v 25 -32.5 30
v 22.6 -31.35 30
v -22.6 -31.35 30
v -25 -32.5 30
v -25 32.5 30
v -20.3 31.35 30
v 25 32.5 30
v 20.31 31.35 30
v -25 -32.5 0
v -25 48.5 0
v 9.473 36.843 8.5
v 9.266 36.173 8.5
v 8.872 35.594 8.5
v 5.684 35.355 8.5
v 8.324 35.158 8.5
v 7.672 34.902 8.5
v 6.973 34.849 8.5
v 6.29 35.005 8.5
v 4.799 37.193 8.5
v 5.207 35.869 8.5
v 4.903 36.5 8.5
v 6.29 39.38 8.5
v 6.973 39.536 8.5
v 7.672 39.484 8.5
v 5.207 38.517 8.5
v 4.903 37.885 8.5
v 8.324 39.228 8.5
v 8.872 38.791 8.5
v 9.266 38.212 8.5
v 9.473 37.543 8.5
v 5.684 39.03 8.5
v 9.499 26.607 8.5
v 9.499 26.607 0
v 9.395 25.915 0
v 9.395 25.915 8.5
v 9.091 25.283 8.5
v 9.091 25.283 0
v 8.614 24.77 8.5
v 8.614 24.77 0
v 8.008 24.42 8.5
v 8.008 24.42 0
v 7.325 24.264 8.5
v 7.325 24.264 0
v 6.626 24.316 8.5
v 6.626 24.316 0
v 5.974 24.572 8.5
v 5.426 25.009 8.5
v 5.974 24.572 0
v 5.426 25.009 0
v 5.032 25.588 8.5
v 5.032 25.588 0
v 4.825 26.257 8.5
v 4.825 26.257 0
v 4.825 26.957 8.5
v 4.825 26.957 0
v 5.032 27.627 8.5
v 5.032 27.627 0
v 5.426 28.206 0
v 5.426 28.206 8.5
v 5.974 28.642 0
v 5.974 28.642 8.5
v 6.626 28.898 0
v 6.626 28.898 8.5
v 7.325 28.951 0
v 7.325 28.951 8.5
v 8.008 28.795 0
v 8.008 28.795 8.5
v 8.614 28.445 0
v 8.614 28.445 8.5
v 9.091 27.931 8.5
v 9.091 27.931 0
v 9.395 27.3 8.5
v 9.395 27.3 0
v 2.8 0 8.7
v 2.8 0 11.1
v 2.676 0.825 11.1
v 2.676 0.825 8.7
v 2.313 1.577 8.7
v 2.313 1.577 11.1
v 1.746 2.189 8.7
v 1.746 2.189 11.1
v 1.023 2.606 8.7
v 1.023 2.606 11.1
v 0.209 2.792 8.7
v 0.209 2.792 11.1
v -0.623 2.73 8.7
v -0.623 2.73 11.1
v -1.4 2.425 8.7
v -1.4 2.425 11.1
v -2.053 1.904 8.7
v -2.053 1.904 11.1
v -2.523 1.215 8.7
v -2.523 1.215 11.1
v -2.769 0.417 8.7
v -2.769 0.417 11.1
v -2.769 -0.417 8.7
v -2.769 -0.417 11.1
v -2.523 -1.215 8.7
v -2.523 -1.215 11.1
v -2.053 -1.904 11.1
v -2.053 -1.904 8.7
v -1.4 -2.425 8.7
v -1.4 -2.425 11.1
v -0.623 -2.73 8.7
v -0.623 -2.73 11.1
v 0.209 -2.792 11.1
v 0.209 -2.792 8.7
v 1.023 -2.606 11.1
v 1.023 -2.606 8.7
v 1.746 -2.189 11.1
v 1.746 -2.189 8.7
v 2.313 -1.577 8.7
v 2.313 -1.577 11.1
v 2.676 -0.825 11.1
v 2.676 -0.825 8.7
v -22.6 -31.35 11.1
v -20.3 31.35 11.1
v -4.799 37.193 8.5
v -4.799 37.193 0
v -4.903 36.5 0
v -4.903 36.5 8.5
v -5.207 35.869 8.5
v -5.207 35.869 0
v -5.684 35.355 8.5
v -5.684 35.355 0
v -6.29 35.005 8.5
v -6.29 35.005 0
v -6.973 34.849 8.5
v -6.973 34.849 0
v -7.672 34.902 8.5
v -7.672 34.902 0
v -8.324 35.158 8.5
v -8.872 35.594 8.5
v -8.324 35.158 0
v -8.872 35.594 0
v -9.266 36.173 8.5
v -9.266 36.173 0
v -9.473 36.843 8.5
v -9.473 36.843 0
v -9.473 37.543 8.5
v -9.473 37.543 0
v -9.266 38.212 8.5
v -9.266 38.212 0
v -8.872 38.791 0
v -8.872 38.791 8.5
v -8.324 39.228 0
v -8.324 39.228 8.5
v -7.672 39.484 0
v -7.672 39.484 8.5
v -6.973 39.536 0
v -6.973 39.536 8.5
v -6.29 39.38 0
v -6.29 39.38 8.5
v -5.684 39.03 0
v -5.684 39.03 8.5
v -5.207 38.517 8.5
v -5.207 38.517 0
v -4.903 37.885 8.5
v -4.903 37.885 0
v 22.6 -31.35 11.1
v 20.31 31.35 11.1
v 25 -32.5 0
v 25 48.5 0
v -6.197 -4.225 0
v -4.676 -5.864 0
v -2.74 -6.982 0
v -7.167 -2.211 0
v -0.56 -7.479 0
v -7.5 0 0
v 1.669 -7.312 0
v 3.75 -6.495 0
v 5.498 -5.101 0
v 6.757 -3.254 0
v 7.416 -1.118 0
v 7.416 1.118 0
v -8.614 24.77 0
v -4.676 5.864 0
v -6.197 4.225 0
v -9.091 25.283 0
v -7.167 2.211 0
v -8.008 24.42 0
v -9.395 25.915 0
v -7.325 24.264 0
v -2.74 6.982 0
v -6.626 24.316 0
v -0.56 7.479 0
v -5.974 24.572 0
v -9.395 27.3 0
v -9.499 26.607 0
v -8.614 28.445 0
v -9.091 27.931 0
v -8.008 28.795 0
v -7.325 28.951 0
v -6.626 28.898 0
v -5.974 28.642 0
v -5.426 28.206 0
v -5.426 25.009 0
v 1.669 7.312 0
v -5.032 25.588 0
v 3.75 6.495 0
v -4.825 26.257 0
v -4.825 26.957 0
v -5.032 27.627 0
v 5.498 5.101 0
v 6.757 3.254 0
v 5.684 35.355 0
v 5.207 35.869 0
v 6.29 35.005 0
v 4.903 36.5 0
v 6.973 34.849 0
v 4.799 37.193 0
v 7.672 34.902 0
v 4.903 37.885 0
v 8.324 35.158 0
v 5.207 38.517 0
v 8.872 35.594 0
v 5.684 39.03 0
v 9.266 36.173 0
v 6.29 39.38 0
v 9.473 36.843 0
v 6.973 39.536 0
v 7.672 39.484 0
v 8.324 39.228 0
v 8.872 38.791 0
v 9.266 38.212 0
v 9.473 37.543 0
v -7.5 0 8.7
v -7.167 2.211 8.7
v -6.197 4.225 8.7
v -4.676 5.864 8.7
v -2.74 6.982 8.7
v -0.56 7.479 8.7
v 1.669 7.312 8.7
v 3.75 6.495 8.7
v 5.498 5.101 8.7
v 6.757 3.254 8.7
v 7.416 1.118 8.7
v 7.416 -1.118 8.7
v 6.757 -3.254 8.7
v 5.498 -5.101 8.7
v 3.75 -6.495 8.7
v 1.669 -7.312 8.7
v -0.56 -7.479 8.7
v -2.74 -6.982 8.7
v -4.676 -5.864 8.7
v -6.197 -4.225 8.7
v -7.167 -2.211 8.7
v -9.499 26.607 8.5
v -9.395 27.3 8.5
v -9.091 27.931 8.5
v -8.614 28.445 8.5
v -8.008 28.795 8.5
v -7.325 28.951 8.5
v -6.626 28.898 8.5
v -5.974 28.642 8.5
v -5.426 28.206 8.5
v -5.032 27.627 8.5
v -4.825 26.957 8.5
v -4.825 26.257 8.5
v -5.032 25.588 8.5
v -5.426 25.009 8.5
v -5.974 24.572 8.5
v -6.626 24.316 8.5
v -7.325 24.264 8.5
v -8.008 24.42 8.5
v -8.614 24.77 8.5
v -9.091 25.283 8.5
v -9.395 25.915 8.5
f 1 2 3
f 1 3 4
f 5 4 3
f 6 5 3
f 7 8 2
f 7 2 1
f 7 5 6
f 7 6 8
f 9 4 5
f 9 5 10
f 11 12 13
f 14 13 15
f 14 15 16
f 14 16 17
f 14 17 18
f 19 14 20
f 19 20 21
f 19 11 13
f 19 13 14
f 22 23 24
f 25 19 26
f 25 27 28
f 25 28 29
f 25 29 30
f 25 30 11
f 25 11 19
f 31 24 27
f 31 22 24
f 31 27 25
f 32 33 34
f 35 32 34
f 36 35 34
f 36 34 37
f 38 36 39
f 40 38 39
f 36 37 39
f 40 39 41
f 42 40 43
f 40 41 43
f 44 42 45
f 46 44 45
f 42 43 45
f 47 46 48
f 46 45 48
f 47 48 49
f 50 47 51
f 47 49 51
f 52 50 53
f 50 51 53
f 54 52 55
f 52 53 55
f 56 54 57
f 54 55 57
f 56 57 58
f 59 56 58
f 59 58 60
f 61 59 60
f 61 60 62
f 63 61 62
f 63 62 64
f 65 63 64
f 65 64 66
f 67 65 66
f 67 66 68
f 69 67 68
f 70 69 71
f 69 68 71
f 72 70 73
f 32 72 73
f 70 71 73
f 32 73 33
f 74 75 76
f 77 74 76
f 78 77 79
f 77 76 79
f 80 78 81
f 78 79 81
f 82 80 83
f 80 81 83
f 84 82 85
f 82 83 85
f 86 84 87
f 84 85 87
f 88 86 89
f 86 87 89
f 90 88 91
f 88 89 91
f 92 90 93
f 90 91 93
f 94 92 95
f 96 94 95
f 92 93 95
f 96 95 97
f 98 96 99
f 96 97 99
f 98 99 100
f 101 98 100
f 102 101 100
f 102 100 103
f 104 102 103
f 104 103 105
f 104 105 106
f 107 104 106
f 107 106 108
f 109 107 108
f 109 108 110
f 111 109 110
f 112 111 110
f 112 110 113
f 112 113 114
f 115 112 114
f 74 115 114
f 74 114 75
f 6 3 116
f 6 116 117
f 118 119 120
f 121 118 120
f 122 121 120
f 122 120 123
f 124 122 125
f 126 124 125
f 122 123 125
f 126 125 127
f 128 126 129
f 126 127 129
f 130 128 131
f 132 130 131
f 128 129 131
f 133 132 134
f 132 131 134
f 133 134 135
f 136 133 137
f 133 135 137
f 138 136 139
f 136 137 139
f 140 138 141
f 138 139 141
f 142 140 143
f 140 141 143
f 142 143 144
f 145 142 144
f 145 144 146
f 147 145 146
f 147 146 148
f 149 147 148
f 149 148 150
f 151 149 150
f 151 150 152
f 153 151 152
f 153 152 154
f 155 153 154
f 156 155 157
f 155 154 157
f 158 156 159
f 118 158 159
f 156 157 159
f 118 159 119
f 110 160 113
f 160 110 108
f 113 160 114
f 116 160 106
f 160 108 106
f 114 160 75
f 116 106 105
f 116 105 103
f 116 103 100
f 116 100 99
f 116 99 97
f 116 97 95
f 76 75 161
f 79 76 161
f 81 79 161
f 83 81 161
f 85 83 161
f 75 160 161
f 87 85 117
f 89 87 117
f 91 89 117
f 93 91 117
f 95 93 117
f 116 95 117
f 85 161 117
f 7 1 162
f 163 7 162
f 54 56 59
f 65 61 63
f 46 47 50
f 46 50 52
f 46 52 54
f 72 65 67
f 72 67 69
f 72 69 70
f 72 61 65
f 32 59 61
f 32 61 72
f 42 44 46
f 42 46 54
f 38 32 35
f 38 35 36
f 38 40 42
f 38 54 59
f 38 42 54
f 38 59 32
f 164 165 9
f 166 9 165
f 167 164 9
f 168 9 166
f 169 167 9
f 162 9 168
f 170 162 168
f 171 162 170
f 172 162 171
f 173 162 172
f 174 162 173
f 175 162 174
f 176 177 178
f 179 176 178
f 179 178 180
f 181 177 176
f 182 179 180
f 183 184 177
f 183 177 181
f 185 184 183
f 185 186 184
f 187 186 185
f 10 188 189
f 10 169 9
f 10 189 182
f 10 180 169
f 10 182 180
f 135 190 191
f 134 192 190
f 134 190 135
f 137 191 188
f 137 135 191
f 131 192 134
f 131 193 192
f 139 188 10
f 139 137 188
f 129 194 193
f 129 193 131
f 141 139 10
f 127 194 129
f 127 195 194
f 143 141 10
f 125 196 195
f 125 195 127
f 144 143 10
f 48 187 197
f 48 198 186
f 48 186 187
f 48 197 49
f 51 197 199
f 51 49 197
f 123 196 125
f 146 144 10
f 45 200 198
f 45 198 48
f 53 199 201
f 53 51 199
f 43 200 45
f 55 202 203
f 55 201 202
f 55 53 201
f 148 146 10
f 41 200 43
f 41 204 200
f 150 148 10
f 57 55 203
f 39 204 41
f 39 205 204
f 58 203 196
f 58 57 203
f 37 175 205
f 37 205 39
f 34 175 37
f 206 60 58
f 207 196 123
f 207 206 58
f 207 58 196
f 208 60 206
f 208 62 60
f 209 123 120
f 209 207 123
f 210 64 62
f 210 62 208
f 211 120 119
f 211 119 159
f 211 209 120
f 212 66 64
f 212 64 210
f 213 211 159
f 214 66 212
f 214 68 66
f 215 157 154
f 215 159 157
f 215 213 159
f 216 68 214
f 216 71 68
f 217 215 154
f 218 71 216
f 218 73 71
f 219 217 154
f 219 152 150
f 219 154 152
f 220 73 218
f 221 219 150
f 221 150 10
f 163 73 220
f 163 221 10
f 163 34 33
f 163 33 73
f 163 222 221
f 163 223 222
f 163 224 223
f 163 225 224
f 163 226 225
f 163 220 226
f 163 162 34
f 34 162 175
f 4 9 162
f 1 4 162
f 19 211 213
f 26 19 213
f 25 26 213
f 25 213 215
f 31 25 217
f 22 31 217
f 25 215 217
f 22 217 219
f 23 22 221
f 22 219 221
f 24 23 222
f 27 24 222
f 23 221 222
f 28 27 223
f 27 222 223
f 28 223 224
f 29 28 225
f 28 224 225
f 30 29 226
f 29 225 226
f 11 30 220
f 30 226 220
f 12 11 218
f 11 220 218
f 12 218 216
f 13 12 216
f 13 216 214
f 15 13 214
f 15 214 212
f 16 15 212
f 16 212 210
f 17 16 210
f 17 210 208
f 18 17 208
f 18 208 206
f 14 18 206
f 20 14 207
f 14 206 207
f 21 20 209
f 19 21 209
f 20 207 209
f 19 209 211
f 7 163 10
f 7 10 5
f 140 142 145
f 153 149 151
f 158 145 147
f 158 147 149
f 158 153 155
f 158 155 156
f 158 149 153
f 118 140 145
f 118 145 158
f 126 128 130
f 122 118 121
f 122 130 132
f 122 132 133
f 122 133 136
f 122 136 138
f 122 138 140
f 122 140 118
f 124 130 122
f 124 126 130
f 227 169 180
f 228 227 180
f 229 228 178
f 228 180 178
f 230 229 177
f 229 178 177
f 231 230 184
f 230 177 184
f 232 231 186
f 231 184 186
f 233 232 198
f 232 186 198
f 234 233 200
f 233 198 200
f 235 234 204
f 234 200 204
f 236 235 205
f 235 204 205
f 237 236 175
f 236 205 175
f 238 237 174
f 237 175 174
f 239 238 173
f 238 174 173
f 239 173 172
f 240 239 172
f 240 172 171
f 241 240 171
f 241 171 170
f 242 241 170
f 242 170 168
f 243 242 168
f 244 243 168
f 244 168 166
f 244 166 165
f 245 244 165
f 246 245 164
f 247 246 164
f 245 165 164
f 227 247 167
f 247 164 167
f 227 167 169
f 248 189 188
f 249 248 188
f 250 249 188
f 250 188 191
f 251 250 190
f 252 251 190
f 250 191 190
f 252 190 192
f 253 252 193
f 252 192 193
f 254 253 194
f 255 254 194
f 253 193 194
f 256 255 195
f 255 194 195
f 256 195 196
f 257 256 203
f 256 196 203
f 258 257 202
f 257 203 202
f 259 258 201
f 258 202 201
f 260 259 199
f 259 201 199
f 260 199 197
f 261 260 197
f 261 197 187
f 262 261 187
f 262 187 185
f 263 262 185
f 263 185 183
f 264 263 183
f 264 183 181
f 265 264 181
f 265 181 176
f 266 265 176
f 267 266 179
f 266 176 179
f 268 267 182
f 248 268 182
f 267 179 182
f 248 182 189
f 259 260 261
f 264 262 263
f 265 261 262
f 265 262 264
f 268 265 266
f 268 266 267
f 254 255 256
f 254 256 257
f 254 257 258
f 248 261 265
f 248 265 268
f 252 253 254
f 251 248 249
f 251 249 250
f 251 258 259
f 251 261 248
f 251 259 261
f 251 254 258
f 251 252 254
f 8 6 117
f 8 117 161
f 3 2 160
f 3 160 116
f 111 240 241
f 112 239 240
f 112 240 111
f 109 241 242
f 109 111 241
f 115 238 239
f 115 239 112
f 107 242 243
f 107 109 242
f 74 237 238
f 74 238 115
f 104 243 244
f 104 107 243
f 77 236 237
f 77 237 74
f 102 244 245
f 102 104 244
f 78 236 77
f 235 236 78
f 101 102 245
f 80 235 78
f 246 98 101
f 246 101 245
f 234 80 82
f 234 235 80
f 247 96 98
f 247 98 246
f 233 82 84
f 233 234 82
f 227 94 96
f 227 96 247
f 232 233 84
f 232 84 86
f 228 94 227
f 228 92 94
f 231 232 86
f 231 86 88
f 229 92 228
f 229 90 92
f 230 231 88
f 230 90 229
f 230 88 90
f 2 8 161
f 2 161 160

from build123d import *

# Parameters (mm, degrees)
SKICA1_W                 = 50
SKICA1_H                 = 65
P_IDAT_VYSUNUT_M1_DEPTH  = 30
P_IDAT_VYSUNUT_M2_DEPTH  = 50
ODEBRAT_VYSUNUT_M1_DEPTH = 18.9
SKICA6_R                 = 2.8
ODEBRAT_VYSUNUT_M2_DEPTH = 58.744783314
SKICA7_R                 = 7.5
ODEBRAT_VYSUNUT_M3_DEPTH = 8.7
SKICA8_R                 = 2.35
ODEBRAT_VYSUNUT_M4_DEPTH = 8.5


with BuildPart() as part:
    # Skica1 → Přidat vysunutím1 (new body)
    with BuildSketch(Plane.XY):
        Rectangle(SKICA1_W, SKICA1_H)
    extrude(amount=P_IDAT_VYSUNUT_M1_DEPTH)

    # Skica3 → Přidat vysunutím2 (add, through all)
    with BuildSketch(Plane(origin=(25, 0, 0), x_dir=(0, 0, -1), z_dir=(1, 0, 0))):
        Polygon((0, 32.5), (0, 48.5), (-30, 32.5), align=None)
    extrude(amount=-P_IDAT_VYSUNUT_M2_DEPTH)

    # Skica5 → Odebrat vysunutím1 (cut)
    with BuildSketch(Plane.XY.offset(30)):
        Polygon((-20.3, 31.35), (20.31, 31.35), (22.6, -31.35), (-22.6, -31.35), align=None)
    extrude(amount=-ODEBRAT_VYSUNUT_M1_DEPTH, mode=Mode.SUBTRACT)

    # Skica6 → Odebrat vysunutím2 (cut, through all)
    with BuildSketch(Plane.XY.offset(11.1)):
        Circle(SKICA6_R)
    extrude(amount=-ODEBRAT_VYSUNUT_M2_DEPTH, mode=Mode.SUBTRACT)

    # Skica7 → Odebrat vysunutím3 (cut)
    with BuildSketch(Plane(origin=(0, 0, 0), x_dir=(-1, 0, 0), z_dir=(0, 0, -1))):
        Circle(SKICA7_R)
    extrude(amount=-ODEBRAT_VYSUNUT_M3_DEPTH, mode=Mode.SUBTRACT)

    # Skica8 → Odebrat vysunutím4 (cut)
    with BuildSketch(Plane(origin=(0, 0, 0), x_dir=(-1, 0, 0), z_dir=(0, 0, -1))):
        with Locations((7.14901322, 26.607213292)):
            Circle(SKICA8_R)
        with Locations(Location((-7.14901322, 26.607213292, 0), (0, 0, 180))):
            Circle(SKICA8_R)
        with Locations(Location((7.14901322, 37.192786708, 0), (0, 0, 180))):
            Circle(SKICA8_R)
        with Locations((-7.14901322, 37.192786708)):
            Circle(SKICA8_R)
    extrude(amount=-ODEBRAT_VYSUNUT_M4_DEPTH, mode=Mode.SUBTRACT)


solid = part.part
